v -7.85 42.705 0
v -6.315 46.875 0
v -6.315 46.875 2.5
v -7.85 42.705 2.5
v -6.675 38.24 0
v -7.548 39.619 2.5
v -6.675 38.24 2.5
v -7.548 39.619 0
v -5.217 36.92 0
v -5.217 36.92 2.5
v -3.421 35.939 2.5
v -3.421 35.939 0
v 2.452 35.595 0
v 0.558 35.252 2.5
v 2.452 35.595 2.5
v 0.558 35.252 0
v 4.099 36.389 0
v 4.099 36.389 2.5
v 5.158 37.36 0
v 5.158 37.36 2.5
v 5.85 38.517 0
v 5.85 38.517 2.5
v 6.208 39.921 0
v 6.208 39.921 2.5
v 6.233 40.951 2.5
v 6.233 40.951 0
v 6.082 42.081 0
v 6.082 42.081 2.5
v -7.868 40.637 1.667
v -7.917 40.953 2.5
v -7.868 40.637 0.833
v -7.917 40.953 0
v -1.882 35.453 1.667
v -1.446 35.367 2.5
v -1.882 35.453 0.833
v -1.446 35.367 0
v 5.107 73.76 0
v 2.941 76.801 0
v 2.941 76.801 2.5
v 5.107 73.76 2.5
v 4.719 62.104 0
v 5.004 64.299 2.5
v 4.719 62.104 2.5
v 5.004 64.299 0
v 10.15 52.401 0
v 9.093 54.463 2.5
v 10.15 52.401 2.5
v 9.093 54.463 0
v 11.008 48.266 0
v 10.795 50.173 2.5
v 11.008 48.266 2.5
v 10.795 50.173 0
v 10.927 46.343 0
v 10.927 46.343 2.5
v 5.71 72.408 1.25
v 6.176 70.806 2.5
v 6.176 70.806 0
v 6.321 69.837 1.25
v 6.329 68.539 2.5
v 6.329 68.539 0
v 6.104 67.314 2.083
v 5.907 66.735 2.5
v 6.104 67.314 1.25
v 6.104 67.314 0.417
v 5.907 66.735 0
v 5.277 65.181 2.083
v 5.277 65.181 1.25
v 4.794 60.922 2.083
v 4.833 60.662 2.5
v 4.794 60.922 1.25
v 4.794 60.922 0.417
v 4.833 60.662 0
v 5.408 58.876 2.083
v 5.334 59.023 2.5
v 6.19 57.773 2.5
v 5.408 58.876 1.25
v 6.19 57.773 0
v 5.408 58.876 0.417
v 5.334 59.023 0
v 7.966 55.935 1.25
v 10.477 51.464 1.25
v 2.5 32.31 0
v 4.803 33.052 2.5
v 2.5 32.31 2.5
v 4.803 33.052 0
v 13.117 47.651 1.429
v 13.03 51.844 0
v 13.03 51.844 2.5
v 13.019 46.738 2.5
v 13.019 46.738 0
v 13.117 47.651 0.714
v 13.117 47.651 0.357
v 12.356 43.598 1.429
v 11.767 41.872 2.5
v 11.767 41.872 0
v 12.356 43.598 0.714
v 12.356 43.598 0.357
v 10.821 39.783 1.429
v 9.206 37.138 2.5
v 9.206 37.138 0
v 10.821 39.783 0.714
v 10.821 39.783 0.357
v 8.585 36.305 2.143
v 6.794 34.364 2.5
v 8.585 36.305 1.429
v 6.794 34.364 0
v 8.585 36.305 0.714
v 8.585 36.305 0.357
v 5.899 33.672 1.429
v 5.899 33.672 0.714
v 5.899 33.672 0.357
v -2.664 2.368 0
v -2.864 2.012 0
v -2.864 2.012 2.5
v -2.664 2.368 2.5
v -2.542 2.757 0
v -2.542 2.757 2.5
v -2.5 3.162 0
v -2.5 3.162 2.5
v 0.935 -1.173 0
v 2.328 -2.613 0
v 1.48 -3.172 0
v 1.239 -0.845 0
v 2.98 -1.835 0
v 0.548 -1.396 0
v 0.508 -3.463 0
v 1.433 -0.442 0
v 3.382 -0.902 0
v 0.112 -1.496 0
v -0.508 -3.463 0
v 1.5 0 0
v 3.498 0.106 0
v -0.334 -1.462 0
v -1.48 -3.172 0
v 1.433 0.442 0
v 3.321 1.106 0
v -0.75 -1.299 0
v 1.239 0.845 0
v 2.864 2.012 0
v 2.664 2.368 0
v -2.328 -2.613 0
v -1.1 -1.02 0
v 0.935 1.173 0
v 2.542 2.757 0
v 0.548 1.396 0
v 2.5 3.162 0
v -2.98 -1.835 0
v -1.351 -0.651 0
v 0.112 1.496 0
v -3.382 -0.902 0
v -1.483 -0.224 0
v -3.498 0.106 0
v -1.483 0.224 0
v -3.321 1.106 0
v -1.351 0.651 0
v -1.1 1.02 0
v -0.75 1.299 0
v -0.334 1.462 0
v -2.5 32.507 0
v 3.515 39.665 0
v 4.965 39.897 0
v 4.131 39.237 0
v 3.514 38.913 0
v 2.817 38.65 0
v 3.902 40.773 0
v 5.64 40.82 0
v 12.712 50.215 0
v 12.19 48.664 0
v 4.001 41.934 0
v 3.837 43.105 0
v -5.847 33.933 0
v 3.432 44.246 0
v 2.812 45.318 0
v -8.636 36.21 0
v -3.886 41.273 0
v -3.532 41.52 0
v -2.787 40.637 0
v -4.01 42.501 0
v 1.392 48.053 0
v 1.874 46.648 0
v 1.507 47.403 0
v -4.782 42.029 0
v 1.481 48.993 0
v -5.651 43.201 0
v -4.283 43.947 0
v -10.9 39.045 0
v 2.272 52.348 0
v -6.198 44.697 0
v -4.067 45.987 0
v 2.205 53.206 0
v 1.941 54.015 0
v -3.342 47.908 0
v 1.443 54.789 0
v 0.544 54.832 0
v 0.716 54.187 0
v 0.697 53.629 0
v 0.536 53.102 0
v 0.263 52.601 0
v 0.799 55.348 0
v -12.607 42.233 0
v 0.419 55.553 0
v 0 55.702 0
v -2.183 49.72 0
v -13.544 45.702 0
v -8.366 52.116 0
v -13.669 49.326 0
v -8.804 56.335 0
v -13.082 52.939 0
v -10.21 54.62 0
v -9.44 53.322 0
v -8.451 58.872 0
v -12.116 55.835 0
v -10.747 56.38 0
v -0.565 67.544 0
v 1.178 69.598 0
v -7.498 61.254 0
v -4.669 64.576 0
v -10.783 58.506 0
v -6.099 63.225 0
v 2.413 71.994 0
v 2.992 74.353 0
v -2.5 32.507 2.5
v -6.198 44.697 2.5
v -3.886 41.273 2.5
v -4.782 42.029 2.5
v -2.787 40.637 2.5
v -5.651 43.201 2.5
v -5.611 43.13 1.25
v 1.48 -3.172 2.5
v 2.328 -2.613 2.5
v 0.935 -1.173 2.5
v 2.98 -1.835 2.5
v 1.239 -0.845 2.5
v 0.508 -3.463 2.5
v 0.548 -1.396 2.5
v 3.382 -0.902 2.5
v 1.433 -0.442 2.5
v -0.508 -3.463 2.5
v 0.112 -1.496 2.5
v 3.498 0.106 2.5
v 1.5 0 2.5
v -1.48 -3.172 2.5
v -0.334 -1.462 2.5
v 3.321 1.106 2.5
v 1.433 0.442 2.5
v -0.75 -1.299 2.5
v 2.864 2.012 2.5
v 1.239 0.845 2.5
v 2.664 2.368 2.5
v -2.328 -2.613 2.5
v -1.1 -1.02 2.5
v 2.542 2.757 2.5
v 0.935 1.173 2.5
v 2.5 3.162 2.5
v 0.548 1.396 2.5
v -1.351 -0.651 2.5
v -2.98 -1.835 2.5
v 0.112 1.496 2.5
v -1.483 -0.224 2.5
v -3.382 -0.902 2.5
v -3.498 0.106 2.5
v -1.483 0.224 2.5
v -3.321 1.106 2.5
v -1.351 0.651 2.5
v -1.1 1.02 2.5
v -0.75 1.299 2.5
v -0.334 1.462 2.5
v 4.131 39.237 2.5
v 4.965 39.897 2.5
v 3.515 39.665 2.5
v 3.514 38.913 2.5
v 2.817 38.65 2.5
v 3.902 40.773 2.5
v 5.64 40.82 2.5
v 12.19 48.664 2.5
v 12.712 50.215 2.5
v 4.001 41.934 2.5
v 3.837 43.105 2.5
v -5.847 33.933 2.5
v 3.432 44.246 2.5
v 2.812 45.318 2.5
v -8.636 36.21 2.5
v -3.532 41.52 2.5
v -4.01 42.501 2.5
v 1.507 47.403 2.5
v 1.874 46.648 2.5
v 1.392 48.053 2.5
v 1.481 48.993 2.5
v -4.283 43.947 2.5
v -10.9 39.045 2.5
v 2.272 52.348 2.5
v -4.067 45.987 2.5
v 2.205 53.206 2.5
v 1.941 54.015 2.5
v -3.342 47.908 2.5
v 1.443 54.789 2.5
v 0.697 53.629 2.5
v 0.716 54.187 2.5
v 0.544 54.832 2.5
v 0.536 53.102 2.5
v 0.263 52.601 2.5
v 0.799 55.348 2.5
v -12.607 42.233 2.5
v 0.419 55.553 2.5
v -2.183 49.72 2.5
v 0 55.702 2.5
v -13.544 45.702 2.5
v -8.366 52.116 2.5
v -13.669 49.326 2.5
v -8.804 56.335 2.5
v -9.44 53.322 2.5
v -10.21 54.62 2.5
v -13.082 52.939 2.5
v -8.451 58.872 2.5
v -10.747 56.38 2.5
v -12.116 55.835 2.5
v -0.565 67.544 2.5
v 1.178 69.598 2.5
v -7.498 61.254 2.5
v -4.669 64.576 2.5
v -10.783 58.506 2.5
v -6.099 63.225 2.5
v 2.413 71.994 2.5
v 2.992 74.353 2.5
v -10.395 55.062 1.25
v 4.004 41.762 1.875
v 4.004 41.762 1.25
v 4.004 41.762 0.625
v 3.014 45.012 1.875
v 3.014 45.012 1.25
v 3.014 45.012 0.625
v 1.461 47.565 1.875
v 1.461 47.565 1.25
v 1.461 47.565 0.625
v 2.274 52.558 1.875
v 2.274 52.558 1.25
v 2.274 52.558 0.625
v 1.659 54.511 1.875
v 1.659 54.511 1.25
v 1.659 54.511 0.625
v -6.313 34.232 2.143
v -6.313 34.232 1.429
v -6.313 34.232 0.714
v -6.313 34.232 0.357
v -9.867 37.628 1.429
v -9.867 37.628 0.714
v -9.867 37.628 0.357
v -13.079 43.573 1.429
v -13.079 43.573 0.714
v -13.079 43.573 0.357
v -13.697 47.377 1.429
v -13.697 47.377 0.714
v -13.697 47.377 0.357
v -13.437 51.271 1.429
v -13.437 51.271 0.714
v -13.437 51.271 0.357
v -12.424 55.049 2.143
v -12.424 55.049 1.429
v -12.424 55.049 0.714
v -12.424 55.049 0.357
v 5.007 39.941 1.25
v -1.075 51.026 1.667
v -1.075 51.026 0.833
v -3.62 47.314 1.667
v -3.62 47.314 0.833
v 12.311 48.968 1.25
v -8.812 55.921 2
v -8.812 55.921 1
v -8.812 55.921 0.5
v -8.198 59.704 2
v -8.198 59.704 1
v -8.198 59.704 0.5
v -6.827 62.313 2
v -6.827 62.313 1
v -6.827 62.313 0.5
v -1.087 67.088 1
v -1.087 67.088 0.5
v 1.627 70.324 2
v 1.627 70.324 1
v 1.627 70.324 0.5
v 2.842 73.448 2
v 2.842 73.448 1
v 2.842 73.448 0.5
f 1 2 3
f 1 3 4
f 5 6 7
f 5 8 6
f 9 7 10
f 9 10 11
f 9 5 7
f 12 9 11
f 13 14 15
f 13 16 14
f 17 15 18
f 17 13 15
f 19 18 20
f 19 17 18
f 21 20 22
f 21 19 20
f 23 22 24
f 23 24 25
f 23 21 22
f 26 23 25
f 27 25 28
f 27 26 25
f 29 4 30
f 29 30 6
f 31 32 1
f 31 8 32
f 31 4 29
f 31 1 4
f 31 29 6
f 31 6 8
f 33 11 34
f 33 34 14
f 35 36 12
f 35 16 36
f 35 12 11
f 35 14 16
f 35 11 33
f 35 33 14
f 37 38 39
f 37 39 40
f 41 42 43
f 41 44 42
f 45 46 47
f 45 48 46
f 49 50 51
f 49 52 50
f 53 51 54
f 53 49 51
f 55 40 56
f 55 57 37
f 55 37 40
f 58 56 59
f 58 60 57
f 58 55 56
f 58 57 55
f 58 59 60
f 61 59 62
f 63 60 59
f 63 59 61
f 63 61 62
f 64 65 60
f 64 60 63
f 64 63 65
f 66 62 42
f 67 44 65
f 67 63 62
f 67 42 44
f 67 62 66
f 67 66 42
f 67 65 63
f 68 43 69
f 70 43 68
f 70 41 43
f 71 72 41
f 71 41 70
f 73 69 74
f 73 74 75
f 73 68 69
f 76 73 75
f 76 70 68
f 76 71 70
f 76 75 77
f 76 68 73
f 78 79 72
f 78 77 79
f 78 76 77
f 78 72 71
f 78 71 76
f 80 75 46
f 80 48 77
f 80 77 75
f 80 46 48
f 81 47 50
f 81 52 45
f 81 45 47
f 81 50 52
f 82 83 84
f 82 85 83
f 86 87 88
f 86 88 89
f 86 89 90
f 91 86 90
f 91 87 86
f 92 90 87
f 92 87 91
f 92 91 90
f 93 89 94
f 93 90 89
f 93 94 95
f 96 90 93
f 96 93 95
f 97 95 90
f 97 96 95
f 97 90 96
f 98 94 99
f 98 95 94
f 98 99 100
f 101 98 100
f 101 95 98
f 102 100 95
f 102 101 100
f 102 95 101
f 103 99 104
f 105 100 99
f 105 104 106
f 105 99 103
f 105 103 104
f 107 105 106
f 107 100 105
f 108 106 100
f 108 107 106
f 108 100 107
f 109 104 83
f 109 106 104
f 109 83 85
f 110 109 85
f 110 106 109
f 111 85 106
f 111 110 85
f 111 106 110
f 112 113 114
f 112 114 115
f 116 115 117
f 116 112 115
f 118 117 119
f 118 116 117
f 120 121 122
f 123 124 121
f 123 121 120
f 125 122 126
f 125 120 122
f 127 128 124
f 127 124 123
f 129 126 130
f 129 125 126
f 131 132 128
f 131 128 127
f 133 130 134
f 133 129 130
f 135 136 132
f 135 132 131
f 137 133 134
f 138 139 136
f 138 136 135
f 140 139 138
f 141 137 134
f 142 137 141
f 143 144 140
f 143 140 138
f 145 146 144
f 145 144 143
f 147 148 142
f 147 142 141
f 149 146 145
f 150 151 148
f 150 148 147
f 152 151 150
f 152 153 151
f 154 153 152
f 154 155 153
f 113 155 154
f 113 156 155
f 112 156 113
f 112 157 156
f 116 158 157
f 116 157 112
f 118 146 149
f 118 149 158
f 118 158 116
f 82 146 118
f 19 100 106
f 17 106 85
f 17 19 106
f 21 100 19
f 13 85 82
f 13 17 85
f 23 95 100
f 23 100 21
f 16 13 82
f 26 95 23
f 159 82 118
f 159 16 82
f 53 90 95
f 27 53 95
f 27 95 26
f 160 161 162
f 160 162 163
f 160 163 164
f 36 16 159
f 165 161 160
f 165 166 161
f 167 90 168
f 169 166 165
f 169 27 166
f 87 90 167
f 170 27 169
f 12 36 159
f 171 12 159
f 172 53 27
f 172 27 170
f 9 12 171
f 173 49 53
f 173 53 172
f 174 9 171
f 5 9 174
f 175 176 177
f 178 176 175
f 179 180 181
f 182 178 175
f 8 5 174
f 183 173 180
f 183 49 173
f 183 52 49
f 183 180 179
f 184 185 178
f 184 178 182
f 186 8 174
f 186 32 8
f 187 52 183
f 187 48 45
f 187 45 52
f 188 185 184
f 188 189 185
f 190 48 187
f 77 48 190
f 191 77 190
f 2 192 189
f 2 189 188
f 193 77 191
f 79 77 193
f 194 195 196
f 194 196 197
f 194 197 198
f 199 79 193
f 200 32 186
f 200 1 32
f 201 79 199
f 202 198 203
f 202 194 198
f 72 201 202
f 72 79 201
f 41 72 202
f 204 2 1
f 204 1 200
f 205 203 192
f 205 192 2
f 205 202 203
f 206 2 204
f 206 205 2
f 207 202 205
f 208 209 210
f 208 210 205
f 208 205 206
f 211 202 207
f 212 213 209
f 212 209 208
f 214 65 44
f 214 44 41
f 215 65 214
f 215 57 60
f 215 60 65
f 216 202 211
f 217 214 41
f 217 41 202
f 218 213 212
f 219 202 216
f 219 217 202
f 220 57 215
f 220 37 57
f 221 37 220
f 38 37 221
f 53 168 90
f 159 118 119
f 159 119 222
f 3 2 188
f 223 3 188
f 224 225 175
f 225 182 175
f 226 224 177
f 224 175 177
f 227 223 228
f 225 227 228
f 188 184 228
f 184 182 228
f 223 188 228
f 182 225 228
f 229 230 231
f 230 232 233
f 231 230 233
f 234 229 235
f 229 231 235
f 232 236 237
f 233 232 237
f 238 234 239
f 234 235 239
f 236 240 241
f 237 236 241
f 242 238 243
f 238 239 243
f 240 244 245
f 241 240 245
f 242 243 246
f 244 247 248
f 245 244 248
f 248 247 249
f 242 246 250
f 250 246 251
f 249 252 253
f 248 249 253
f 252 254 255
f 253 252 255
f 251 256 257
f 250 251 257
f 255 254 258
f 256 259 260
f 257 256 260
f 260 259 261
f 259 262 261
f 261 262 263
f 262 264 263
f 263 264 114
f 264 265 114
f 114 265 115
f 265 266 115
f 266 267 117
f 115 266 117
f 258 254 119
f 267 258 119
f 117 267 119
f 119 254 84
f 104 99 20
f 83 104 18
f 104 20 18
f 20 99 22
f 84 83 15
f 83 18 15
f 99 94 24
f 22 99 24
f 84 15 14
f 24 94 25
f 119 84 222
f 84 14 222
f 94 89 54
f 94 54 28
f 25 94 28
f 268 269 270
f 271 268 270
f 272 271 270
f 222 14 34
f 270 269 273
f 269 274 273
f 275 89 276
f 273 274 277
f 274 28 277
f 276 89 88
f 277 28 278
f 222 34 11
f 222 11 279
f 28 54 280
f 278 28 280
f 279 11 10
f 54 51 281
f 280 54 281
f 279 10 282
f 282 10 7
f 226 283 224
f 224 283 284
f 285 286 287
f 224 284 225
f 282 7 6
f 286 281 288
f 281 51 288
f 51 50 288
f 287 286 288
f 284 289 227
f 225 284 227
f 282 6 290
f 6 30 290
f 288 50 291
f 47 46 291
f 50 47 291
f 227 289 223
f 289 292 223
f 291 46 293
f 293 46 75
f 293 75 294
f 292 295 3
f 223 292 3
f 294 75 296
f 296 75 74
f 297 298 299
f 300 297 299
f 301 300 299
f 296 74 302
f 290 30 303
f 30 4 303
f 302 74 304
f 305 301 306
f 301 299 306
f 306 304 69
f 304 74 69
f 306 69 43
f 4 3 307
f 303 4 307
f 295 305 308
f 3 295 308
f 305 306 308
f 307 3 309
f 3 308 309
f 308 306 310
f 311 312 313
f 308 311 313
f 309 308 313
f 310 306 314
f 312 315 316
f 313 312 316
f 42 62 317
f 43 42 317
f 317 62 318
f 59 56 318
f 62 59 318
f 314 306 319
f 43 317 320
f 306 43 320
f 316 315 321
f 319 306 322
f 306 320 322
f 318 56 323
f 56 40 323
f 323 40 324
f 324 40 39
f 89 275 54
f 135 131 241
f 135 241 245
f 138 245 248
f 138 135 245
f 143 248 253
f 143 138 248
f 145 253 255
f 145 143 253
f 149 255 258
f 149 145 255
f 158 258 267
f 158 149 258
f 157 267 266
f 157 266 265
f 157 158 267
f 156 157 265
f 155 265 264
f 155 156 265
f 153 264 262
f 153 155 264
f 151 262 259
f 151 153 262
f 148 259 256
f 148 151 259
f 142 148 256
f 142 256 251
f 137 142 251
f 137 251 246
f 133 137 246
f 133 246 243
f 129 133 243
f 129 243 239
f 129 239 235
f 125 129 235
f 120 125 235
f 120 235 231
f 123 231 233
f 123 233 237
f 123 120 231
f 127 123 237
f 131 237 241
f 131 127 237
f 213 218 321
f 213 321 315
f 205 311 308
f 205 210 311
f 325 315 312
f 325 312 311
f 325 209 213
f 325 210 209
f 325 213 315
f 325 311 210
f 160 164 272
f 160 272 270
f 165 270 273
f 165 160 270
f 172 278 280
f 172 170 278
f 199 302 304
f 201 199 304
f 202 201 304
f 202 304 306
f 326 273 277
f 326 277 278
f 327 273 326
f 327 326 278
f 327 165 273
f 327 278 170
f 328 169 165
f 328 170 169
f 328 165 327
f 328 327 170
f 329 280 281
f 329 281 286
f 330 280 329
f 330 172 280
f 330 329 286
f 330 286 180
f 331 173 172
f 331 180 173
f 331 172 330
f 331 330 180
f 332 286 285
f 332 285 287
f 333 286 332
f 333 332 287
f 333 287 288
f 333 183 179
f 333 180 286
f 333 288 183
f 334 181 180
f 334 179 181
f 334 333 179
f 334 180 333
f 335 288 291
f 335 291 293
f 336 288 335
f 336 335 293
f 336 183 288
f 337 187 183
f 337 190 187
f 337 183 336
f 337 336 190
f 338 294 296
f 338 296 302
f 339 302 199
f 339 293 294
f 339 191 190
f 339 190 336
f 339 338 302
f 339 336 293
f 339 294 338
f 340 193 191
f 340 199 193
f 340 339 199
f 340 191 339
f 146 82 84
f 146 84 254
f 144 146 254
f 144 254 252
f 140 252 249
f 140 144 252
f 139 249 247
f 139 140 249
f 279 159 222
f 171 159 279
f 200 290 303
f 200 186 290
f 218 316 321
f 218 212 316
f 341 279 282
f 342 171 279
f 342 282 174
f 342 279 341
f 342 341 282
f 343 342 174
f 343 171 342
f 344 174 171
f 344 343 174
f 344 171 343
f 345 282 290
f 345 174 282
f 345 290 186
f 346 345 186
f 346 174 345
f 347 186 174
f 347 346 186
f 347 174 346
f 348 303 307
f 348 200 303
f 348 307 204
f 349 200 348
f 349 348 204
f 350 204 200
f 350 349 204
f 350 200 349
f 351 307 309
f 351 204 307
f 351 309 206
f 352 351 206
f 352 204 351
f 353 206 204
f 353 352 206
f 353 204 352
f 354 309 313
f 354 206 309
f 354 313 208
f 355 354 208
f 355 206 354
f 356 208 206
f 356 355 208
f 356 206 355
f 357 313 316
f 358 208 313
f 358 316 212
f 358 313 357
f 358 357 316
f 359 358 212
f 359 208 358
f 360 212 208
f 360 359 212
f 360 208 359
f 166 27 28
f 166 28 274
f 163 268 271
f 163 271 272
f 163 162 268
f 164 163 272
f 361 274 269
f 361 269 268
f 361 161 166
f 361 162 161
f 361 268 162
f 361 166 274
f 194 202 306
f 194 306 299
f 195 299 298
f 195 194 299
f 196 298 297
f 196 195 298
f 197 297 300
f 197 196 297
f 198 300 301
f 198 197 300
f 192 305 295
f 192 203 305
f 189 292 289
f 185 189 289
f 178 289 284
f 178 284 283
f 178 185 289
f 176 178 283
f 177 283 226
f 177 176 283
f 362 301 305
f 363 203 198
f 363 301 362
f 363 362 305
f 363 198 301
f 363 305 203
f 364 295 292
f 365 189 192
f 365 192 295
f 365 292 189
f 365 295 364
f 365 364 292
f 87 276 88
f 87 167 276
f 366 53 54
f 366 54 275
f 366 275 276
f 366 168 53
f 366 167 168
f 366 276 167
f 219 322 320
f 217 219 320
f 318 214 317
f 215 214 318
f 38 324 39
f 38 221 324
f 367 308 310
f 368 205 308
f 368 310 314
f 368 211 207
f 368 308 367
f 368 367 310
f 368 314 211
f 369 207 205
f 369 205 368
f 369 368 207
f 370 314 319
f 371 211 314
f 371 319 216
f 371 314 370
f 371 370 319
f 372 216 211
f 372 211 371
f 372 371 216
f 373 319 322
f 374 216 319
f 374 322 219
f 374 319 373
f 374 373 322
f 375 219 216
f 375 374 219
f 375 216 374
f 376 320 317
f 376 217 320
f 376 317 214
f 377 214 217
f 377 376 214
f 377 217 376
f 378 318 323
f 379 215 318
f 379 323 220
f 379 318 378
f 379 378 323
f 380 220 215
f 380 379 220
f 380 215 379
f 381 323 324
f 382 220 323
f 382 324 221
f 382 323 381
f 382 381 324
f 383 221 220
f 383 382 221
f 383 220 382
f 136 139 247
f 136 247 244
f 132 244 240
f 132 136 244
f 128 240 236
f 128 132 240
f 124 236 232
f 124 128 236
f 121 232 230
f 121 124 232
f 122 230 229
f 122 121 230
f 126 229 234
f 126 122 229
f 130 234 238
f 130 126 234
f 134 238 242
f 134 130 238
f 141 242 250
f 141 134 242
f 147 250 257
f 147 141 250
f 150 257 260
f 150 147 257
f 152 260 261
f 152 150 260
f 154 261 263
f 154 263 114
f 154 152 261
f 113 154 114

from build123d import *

# Parameters (mm, degrees)
SKETCH_1_R      = 1.5
EXTRUDE_1_DEPTH = 2.5
EXTRUDE_2_DEPTH = 2.5


with BuildPart() as part:
    # 草图1 → 凸台-拉伸1 (new body)
    with BuildSketch(Plane.XY):
        with BuildLine():
            Line((-2.5, 3.16227766), (-2.5, 33.16227766))
            Line((-2.5, 33.16227766), (2.5, 33.16227766))
            Line((2.5, 33.16227766), (2.5, 3.16227766))
            ThreePointArc((2.5, 3.16227766), (2.593074822, 2.559254971), (2.863636364, 2.012358511))
            ThreePointArc((2.863636364, 2.012358511), (0, -3.5), (-2.863636364, 2.012358511))
            ThreePointArc((-2.863636364, 2.012358511), (-2.593074822, 2.559254971), (-2.5, 3.16227766))
        make_face()
        Circle(SKETCH_1_R, mode=Mode.SUBTRACT)
    extrude(amount=EXTRUDE_1_DEPTH)

    # 草图3 → 凸台-拉伸2 (add)
    with BuildSketch(Plane.XY):
        with BuildLine():
            add(Edge.make_bspline(
                [(13.030008627, 51.844332221), (13.74379778, 46.20303282), (11.603311076, 39.411743555), (5.694539009, 33.026560377), (0.06310906, 31.476510815), (-5.938123223, 33.386001235), (-10.437145597, 37.95176441), (-15.075154039, 45.990158866), (-13.333751605, 54.20267923), (-10.782884431, 58.505555606)],
                knots=[0, 0, 0, 0, 0.274188336, 0.336809371, 0.426488787, 0.549059577, 0.630888515, 0.743399692, 1, 1, 1, 1], degree=3))
            add(Edge.make_bspline(
                [(-10.782884431, 58.505555606), (-11.216241735, 54.813303601), (-8.366423312, 52.116268581)],
                knots=[0, 0, 0, 1, 1, 1], degree=2))
            add(Edge.make_bspline(
                [(-8.366423312, 52.116268581), (-8.926561192, 54.567170602), (-9.14623331, 59.356108625), (-5.375140908, 64.531118053), (-0.993155908, 66.778771451), (2.387830751, 70.859843716), (3.310682538, 74.537905882), (2.941368858, 76.801367622)],
                knots=[0, 0, 0, 0, 0.264249972, 0.465969617, 0.622952578, 0.768650593, 1, 1, 1, 1], degree=3))
            add(Edge.make_bspline(
                [(2.941368858, 76.801367622), (5.164622483, 74.500255208), (7.468684604, 69.664705034), (4.880128248, 64.613471092), (4.512079656, 61.628617008), (5.422711445, 58.201828704), (9.902080446, 54.717761781), (11.341860507, 49.784976586), (10.927237278, 46.342799268)],
                knots=[0, 0, 0, 0, 0.308930758, 0.378034041, 0.507503817, 0.572041872, 0.689799893, 1, 1, 1, 1], degree=3))
            add(Edge.make_bspline(
                [(10.927237278, 46.342799268), (12.642600648, 48.842046286), (13.030008627, 51.844332221)],
                knots=[0, 0, 0, 1, 1, 1], degree=2))
        make_face()
        with BuildLine():
            add(Edge.make_bspline(
                [(-6.314607616, 46.874525086), (-7.185471605, 45.132998982), (-9.578363226, 39.771279985), (-0.639228761, 32.989686689), (7.184073348, 36.77945643), (6.081863089, 42.080759749)],
                knots=[0, 0, 0, 0, 0.245235377, 0.543680646, 1, 1, 1, 1], degree=3))
            add(Edge.make_bspline(
                [(6.081863089, 42.080759749), (5.565285886, 39.516371923), (2.816862005, 38.650282124)],
                knots=[0, 0, 0, 1, 1, 1], degree=2))
            add(Edge.make_bspline(
                [(2.816862005, 38.650282124), (4.457350443, 40.466562823), (4.195927725, 44.139134684), (0.370759673, 48.008484784), (3.285831901, 52.265139808), (1.414003937, 55.320210325), (0.000188371, 55.70189907)],
                knots=[0, 0, 0, 0, 0.356718219, 0.515081121, 0.783237716, 1, 1, 1, 1], degree=3))
            add(Edge.make_bspline(
                [(0.000188371, 55.70189907), (1.637930063, 53.699479573), (-1.080507308, 51.254114838), (-4.437935186, 46.855363752), (-4.719085804, 42.428895259), (-2.787135359, 40.636763739)],
                knots=[0, 0, 0, 0, 0.313581213, 0.580495324, 1, 1, 1, 1], degree=3))
            add(Edge.make_bspline(
                [(-6.314607616, 46.874525086), (-6.671577447, 42.504428303), (-2.787135359, 40.636763739)],
                knots=[0, 0, 0, 1, 1, 1], degree=2))
        make_face(mode=Mode.SUBTRACT)
    extrude(amount=EXTRUDE_2_DEPTH)


solid = part.part
